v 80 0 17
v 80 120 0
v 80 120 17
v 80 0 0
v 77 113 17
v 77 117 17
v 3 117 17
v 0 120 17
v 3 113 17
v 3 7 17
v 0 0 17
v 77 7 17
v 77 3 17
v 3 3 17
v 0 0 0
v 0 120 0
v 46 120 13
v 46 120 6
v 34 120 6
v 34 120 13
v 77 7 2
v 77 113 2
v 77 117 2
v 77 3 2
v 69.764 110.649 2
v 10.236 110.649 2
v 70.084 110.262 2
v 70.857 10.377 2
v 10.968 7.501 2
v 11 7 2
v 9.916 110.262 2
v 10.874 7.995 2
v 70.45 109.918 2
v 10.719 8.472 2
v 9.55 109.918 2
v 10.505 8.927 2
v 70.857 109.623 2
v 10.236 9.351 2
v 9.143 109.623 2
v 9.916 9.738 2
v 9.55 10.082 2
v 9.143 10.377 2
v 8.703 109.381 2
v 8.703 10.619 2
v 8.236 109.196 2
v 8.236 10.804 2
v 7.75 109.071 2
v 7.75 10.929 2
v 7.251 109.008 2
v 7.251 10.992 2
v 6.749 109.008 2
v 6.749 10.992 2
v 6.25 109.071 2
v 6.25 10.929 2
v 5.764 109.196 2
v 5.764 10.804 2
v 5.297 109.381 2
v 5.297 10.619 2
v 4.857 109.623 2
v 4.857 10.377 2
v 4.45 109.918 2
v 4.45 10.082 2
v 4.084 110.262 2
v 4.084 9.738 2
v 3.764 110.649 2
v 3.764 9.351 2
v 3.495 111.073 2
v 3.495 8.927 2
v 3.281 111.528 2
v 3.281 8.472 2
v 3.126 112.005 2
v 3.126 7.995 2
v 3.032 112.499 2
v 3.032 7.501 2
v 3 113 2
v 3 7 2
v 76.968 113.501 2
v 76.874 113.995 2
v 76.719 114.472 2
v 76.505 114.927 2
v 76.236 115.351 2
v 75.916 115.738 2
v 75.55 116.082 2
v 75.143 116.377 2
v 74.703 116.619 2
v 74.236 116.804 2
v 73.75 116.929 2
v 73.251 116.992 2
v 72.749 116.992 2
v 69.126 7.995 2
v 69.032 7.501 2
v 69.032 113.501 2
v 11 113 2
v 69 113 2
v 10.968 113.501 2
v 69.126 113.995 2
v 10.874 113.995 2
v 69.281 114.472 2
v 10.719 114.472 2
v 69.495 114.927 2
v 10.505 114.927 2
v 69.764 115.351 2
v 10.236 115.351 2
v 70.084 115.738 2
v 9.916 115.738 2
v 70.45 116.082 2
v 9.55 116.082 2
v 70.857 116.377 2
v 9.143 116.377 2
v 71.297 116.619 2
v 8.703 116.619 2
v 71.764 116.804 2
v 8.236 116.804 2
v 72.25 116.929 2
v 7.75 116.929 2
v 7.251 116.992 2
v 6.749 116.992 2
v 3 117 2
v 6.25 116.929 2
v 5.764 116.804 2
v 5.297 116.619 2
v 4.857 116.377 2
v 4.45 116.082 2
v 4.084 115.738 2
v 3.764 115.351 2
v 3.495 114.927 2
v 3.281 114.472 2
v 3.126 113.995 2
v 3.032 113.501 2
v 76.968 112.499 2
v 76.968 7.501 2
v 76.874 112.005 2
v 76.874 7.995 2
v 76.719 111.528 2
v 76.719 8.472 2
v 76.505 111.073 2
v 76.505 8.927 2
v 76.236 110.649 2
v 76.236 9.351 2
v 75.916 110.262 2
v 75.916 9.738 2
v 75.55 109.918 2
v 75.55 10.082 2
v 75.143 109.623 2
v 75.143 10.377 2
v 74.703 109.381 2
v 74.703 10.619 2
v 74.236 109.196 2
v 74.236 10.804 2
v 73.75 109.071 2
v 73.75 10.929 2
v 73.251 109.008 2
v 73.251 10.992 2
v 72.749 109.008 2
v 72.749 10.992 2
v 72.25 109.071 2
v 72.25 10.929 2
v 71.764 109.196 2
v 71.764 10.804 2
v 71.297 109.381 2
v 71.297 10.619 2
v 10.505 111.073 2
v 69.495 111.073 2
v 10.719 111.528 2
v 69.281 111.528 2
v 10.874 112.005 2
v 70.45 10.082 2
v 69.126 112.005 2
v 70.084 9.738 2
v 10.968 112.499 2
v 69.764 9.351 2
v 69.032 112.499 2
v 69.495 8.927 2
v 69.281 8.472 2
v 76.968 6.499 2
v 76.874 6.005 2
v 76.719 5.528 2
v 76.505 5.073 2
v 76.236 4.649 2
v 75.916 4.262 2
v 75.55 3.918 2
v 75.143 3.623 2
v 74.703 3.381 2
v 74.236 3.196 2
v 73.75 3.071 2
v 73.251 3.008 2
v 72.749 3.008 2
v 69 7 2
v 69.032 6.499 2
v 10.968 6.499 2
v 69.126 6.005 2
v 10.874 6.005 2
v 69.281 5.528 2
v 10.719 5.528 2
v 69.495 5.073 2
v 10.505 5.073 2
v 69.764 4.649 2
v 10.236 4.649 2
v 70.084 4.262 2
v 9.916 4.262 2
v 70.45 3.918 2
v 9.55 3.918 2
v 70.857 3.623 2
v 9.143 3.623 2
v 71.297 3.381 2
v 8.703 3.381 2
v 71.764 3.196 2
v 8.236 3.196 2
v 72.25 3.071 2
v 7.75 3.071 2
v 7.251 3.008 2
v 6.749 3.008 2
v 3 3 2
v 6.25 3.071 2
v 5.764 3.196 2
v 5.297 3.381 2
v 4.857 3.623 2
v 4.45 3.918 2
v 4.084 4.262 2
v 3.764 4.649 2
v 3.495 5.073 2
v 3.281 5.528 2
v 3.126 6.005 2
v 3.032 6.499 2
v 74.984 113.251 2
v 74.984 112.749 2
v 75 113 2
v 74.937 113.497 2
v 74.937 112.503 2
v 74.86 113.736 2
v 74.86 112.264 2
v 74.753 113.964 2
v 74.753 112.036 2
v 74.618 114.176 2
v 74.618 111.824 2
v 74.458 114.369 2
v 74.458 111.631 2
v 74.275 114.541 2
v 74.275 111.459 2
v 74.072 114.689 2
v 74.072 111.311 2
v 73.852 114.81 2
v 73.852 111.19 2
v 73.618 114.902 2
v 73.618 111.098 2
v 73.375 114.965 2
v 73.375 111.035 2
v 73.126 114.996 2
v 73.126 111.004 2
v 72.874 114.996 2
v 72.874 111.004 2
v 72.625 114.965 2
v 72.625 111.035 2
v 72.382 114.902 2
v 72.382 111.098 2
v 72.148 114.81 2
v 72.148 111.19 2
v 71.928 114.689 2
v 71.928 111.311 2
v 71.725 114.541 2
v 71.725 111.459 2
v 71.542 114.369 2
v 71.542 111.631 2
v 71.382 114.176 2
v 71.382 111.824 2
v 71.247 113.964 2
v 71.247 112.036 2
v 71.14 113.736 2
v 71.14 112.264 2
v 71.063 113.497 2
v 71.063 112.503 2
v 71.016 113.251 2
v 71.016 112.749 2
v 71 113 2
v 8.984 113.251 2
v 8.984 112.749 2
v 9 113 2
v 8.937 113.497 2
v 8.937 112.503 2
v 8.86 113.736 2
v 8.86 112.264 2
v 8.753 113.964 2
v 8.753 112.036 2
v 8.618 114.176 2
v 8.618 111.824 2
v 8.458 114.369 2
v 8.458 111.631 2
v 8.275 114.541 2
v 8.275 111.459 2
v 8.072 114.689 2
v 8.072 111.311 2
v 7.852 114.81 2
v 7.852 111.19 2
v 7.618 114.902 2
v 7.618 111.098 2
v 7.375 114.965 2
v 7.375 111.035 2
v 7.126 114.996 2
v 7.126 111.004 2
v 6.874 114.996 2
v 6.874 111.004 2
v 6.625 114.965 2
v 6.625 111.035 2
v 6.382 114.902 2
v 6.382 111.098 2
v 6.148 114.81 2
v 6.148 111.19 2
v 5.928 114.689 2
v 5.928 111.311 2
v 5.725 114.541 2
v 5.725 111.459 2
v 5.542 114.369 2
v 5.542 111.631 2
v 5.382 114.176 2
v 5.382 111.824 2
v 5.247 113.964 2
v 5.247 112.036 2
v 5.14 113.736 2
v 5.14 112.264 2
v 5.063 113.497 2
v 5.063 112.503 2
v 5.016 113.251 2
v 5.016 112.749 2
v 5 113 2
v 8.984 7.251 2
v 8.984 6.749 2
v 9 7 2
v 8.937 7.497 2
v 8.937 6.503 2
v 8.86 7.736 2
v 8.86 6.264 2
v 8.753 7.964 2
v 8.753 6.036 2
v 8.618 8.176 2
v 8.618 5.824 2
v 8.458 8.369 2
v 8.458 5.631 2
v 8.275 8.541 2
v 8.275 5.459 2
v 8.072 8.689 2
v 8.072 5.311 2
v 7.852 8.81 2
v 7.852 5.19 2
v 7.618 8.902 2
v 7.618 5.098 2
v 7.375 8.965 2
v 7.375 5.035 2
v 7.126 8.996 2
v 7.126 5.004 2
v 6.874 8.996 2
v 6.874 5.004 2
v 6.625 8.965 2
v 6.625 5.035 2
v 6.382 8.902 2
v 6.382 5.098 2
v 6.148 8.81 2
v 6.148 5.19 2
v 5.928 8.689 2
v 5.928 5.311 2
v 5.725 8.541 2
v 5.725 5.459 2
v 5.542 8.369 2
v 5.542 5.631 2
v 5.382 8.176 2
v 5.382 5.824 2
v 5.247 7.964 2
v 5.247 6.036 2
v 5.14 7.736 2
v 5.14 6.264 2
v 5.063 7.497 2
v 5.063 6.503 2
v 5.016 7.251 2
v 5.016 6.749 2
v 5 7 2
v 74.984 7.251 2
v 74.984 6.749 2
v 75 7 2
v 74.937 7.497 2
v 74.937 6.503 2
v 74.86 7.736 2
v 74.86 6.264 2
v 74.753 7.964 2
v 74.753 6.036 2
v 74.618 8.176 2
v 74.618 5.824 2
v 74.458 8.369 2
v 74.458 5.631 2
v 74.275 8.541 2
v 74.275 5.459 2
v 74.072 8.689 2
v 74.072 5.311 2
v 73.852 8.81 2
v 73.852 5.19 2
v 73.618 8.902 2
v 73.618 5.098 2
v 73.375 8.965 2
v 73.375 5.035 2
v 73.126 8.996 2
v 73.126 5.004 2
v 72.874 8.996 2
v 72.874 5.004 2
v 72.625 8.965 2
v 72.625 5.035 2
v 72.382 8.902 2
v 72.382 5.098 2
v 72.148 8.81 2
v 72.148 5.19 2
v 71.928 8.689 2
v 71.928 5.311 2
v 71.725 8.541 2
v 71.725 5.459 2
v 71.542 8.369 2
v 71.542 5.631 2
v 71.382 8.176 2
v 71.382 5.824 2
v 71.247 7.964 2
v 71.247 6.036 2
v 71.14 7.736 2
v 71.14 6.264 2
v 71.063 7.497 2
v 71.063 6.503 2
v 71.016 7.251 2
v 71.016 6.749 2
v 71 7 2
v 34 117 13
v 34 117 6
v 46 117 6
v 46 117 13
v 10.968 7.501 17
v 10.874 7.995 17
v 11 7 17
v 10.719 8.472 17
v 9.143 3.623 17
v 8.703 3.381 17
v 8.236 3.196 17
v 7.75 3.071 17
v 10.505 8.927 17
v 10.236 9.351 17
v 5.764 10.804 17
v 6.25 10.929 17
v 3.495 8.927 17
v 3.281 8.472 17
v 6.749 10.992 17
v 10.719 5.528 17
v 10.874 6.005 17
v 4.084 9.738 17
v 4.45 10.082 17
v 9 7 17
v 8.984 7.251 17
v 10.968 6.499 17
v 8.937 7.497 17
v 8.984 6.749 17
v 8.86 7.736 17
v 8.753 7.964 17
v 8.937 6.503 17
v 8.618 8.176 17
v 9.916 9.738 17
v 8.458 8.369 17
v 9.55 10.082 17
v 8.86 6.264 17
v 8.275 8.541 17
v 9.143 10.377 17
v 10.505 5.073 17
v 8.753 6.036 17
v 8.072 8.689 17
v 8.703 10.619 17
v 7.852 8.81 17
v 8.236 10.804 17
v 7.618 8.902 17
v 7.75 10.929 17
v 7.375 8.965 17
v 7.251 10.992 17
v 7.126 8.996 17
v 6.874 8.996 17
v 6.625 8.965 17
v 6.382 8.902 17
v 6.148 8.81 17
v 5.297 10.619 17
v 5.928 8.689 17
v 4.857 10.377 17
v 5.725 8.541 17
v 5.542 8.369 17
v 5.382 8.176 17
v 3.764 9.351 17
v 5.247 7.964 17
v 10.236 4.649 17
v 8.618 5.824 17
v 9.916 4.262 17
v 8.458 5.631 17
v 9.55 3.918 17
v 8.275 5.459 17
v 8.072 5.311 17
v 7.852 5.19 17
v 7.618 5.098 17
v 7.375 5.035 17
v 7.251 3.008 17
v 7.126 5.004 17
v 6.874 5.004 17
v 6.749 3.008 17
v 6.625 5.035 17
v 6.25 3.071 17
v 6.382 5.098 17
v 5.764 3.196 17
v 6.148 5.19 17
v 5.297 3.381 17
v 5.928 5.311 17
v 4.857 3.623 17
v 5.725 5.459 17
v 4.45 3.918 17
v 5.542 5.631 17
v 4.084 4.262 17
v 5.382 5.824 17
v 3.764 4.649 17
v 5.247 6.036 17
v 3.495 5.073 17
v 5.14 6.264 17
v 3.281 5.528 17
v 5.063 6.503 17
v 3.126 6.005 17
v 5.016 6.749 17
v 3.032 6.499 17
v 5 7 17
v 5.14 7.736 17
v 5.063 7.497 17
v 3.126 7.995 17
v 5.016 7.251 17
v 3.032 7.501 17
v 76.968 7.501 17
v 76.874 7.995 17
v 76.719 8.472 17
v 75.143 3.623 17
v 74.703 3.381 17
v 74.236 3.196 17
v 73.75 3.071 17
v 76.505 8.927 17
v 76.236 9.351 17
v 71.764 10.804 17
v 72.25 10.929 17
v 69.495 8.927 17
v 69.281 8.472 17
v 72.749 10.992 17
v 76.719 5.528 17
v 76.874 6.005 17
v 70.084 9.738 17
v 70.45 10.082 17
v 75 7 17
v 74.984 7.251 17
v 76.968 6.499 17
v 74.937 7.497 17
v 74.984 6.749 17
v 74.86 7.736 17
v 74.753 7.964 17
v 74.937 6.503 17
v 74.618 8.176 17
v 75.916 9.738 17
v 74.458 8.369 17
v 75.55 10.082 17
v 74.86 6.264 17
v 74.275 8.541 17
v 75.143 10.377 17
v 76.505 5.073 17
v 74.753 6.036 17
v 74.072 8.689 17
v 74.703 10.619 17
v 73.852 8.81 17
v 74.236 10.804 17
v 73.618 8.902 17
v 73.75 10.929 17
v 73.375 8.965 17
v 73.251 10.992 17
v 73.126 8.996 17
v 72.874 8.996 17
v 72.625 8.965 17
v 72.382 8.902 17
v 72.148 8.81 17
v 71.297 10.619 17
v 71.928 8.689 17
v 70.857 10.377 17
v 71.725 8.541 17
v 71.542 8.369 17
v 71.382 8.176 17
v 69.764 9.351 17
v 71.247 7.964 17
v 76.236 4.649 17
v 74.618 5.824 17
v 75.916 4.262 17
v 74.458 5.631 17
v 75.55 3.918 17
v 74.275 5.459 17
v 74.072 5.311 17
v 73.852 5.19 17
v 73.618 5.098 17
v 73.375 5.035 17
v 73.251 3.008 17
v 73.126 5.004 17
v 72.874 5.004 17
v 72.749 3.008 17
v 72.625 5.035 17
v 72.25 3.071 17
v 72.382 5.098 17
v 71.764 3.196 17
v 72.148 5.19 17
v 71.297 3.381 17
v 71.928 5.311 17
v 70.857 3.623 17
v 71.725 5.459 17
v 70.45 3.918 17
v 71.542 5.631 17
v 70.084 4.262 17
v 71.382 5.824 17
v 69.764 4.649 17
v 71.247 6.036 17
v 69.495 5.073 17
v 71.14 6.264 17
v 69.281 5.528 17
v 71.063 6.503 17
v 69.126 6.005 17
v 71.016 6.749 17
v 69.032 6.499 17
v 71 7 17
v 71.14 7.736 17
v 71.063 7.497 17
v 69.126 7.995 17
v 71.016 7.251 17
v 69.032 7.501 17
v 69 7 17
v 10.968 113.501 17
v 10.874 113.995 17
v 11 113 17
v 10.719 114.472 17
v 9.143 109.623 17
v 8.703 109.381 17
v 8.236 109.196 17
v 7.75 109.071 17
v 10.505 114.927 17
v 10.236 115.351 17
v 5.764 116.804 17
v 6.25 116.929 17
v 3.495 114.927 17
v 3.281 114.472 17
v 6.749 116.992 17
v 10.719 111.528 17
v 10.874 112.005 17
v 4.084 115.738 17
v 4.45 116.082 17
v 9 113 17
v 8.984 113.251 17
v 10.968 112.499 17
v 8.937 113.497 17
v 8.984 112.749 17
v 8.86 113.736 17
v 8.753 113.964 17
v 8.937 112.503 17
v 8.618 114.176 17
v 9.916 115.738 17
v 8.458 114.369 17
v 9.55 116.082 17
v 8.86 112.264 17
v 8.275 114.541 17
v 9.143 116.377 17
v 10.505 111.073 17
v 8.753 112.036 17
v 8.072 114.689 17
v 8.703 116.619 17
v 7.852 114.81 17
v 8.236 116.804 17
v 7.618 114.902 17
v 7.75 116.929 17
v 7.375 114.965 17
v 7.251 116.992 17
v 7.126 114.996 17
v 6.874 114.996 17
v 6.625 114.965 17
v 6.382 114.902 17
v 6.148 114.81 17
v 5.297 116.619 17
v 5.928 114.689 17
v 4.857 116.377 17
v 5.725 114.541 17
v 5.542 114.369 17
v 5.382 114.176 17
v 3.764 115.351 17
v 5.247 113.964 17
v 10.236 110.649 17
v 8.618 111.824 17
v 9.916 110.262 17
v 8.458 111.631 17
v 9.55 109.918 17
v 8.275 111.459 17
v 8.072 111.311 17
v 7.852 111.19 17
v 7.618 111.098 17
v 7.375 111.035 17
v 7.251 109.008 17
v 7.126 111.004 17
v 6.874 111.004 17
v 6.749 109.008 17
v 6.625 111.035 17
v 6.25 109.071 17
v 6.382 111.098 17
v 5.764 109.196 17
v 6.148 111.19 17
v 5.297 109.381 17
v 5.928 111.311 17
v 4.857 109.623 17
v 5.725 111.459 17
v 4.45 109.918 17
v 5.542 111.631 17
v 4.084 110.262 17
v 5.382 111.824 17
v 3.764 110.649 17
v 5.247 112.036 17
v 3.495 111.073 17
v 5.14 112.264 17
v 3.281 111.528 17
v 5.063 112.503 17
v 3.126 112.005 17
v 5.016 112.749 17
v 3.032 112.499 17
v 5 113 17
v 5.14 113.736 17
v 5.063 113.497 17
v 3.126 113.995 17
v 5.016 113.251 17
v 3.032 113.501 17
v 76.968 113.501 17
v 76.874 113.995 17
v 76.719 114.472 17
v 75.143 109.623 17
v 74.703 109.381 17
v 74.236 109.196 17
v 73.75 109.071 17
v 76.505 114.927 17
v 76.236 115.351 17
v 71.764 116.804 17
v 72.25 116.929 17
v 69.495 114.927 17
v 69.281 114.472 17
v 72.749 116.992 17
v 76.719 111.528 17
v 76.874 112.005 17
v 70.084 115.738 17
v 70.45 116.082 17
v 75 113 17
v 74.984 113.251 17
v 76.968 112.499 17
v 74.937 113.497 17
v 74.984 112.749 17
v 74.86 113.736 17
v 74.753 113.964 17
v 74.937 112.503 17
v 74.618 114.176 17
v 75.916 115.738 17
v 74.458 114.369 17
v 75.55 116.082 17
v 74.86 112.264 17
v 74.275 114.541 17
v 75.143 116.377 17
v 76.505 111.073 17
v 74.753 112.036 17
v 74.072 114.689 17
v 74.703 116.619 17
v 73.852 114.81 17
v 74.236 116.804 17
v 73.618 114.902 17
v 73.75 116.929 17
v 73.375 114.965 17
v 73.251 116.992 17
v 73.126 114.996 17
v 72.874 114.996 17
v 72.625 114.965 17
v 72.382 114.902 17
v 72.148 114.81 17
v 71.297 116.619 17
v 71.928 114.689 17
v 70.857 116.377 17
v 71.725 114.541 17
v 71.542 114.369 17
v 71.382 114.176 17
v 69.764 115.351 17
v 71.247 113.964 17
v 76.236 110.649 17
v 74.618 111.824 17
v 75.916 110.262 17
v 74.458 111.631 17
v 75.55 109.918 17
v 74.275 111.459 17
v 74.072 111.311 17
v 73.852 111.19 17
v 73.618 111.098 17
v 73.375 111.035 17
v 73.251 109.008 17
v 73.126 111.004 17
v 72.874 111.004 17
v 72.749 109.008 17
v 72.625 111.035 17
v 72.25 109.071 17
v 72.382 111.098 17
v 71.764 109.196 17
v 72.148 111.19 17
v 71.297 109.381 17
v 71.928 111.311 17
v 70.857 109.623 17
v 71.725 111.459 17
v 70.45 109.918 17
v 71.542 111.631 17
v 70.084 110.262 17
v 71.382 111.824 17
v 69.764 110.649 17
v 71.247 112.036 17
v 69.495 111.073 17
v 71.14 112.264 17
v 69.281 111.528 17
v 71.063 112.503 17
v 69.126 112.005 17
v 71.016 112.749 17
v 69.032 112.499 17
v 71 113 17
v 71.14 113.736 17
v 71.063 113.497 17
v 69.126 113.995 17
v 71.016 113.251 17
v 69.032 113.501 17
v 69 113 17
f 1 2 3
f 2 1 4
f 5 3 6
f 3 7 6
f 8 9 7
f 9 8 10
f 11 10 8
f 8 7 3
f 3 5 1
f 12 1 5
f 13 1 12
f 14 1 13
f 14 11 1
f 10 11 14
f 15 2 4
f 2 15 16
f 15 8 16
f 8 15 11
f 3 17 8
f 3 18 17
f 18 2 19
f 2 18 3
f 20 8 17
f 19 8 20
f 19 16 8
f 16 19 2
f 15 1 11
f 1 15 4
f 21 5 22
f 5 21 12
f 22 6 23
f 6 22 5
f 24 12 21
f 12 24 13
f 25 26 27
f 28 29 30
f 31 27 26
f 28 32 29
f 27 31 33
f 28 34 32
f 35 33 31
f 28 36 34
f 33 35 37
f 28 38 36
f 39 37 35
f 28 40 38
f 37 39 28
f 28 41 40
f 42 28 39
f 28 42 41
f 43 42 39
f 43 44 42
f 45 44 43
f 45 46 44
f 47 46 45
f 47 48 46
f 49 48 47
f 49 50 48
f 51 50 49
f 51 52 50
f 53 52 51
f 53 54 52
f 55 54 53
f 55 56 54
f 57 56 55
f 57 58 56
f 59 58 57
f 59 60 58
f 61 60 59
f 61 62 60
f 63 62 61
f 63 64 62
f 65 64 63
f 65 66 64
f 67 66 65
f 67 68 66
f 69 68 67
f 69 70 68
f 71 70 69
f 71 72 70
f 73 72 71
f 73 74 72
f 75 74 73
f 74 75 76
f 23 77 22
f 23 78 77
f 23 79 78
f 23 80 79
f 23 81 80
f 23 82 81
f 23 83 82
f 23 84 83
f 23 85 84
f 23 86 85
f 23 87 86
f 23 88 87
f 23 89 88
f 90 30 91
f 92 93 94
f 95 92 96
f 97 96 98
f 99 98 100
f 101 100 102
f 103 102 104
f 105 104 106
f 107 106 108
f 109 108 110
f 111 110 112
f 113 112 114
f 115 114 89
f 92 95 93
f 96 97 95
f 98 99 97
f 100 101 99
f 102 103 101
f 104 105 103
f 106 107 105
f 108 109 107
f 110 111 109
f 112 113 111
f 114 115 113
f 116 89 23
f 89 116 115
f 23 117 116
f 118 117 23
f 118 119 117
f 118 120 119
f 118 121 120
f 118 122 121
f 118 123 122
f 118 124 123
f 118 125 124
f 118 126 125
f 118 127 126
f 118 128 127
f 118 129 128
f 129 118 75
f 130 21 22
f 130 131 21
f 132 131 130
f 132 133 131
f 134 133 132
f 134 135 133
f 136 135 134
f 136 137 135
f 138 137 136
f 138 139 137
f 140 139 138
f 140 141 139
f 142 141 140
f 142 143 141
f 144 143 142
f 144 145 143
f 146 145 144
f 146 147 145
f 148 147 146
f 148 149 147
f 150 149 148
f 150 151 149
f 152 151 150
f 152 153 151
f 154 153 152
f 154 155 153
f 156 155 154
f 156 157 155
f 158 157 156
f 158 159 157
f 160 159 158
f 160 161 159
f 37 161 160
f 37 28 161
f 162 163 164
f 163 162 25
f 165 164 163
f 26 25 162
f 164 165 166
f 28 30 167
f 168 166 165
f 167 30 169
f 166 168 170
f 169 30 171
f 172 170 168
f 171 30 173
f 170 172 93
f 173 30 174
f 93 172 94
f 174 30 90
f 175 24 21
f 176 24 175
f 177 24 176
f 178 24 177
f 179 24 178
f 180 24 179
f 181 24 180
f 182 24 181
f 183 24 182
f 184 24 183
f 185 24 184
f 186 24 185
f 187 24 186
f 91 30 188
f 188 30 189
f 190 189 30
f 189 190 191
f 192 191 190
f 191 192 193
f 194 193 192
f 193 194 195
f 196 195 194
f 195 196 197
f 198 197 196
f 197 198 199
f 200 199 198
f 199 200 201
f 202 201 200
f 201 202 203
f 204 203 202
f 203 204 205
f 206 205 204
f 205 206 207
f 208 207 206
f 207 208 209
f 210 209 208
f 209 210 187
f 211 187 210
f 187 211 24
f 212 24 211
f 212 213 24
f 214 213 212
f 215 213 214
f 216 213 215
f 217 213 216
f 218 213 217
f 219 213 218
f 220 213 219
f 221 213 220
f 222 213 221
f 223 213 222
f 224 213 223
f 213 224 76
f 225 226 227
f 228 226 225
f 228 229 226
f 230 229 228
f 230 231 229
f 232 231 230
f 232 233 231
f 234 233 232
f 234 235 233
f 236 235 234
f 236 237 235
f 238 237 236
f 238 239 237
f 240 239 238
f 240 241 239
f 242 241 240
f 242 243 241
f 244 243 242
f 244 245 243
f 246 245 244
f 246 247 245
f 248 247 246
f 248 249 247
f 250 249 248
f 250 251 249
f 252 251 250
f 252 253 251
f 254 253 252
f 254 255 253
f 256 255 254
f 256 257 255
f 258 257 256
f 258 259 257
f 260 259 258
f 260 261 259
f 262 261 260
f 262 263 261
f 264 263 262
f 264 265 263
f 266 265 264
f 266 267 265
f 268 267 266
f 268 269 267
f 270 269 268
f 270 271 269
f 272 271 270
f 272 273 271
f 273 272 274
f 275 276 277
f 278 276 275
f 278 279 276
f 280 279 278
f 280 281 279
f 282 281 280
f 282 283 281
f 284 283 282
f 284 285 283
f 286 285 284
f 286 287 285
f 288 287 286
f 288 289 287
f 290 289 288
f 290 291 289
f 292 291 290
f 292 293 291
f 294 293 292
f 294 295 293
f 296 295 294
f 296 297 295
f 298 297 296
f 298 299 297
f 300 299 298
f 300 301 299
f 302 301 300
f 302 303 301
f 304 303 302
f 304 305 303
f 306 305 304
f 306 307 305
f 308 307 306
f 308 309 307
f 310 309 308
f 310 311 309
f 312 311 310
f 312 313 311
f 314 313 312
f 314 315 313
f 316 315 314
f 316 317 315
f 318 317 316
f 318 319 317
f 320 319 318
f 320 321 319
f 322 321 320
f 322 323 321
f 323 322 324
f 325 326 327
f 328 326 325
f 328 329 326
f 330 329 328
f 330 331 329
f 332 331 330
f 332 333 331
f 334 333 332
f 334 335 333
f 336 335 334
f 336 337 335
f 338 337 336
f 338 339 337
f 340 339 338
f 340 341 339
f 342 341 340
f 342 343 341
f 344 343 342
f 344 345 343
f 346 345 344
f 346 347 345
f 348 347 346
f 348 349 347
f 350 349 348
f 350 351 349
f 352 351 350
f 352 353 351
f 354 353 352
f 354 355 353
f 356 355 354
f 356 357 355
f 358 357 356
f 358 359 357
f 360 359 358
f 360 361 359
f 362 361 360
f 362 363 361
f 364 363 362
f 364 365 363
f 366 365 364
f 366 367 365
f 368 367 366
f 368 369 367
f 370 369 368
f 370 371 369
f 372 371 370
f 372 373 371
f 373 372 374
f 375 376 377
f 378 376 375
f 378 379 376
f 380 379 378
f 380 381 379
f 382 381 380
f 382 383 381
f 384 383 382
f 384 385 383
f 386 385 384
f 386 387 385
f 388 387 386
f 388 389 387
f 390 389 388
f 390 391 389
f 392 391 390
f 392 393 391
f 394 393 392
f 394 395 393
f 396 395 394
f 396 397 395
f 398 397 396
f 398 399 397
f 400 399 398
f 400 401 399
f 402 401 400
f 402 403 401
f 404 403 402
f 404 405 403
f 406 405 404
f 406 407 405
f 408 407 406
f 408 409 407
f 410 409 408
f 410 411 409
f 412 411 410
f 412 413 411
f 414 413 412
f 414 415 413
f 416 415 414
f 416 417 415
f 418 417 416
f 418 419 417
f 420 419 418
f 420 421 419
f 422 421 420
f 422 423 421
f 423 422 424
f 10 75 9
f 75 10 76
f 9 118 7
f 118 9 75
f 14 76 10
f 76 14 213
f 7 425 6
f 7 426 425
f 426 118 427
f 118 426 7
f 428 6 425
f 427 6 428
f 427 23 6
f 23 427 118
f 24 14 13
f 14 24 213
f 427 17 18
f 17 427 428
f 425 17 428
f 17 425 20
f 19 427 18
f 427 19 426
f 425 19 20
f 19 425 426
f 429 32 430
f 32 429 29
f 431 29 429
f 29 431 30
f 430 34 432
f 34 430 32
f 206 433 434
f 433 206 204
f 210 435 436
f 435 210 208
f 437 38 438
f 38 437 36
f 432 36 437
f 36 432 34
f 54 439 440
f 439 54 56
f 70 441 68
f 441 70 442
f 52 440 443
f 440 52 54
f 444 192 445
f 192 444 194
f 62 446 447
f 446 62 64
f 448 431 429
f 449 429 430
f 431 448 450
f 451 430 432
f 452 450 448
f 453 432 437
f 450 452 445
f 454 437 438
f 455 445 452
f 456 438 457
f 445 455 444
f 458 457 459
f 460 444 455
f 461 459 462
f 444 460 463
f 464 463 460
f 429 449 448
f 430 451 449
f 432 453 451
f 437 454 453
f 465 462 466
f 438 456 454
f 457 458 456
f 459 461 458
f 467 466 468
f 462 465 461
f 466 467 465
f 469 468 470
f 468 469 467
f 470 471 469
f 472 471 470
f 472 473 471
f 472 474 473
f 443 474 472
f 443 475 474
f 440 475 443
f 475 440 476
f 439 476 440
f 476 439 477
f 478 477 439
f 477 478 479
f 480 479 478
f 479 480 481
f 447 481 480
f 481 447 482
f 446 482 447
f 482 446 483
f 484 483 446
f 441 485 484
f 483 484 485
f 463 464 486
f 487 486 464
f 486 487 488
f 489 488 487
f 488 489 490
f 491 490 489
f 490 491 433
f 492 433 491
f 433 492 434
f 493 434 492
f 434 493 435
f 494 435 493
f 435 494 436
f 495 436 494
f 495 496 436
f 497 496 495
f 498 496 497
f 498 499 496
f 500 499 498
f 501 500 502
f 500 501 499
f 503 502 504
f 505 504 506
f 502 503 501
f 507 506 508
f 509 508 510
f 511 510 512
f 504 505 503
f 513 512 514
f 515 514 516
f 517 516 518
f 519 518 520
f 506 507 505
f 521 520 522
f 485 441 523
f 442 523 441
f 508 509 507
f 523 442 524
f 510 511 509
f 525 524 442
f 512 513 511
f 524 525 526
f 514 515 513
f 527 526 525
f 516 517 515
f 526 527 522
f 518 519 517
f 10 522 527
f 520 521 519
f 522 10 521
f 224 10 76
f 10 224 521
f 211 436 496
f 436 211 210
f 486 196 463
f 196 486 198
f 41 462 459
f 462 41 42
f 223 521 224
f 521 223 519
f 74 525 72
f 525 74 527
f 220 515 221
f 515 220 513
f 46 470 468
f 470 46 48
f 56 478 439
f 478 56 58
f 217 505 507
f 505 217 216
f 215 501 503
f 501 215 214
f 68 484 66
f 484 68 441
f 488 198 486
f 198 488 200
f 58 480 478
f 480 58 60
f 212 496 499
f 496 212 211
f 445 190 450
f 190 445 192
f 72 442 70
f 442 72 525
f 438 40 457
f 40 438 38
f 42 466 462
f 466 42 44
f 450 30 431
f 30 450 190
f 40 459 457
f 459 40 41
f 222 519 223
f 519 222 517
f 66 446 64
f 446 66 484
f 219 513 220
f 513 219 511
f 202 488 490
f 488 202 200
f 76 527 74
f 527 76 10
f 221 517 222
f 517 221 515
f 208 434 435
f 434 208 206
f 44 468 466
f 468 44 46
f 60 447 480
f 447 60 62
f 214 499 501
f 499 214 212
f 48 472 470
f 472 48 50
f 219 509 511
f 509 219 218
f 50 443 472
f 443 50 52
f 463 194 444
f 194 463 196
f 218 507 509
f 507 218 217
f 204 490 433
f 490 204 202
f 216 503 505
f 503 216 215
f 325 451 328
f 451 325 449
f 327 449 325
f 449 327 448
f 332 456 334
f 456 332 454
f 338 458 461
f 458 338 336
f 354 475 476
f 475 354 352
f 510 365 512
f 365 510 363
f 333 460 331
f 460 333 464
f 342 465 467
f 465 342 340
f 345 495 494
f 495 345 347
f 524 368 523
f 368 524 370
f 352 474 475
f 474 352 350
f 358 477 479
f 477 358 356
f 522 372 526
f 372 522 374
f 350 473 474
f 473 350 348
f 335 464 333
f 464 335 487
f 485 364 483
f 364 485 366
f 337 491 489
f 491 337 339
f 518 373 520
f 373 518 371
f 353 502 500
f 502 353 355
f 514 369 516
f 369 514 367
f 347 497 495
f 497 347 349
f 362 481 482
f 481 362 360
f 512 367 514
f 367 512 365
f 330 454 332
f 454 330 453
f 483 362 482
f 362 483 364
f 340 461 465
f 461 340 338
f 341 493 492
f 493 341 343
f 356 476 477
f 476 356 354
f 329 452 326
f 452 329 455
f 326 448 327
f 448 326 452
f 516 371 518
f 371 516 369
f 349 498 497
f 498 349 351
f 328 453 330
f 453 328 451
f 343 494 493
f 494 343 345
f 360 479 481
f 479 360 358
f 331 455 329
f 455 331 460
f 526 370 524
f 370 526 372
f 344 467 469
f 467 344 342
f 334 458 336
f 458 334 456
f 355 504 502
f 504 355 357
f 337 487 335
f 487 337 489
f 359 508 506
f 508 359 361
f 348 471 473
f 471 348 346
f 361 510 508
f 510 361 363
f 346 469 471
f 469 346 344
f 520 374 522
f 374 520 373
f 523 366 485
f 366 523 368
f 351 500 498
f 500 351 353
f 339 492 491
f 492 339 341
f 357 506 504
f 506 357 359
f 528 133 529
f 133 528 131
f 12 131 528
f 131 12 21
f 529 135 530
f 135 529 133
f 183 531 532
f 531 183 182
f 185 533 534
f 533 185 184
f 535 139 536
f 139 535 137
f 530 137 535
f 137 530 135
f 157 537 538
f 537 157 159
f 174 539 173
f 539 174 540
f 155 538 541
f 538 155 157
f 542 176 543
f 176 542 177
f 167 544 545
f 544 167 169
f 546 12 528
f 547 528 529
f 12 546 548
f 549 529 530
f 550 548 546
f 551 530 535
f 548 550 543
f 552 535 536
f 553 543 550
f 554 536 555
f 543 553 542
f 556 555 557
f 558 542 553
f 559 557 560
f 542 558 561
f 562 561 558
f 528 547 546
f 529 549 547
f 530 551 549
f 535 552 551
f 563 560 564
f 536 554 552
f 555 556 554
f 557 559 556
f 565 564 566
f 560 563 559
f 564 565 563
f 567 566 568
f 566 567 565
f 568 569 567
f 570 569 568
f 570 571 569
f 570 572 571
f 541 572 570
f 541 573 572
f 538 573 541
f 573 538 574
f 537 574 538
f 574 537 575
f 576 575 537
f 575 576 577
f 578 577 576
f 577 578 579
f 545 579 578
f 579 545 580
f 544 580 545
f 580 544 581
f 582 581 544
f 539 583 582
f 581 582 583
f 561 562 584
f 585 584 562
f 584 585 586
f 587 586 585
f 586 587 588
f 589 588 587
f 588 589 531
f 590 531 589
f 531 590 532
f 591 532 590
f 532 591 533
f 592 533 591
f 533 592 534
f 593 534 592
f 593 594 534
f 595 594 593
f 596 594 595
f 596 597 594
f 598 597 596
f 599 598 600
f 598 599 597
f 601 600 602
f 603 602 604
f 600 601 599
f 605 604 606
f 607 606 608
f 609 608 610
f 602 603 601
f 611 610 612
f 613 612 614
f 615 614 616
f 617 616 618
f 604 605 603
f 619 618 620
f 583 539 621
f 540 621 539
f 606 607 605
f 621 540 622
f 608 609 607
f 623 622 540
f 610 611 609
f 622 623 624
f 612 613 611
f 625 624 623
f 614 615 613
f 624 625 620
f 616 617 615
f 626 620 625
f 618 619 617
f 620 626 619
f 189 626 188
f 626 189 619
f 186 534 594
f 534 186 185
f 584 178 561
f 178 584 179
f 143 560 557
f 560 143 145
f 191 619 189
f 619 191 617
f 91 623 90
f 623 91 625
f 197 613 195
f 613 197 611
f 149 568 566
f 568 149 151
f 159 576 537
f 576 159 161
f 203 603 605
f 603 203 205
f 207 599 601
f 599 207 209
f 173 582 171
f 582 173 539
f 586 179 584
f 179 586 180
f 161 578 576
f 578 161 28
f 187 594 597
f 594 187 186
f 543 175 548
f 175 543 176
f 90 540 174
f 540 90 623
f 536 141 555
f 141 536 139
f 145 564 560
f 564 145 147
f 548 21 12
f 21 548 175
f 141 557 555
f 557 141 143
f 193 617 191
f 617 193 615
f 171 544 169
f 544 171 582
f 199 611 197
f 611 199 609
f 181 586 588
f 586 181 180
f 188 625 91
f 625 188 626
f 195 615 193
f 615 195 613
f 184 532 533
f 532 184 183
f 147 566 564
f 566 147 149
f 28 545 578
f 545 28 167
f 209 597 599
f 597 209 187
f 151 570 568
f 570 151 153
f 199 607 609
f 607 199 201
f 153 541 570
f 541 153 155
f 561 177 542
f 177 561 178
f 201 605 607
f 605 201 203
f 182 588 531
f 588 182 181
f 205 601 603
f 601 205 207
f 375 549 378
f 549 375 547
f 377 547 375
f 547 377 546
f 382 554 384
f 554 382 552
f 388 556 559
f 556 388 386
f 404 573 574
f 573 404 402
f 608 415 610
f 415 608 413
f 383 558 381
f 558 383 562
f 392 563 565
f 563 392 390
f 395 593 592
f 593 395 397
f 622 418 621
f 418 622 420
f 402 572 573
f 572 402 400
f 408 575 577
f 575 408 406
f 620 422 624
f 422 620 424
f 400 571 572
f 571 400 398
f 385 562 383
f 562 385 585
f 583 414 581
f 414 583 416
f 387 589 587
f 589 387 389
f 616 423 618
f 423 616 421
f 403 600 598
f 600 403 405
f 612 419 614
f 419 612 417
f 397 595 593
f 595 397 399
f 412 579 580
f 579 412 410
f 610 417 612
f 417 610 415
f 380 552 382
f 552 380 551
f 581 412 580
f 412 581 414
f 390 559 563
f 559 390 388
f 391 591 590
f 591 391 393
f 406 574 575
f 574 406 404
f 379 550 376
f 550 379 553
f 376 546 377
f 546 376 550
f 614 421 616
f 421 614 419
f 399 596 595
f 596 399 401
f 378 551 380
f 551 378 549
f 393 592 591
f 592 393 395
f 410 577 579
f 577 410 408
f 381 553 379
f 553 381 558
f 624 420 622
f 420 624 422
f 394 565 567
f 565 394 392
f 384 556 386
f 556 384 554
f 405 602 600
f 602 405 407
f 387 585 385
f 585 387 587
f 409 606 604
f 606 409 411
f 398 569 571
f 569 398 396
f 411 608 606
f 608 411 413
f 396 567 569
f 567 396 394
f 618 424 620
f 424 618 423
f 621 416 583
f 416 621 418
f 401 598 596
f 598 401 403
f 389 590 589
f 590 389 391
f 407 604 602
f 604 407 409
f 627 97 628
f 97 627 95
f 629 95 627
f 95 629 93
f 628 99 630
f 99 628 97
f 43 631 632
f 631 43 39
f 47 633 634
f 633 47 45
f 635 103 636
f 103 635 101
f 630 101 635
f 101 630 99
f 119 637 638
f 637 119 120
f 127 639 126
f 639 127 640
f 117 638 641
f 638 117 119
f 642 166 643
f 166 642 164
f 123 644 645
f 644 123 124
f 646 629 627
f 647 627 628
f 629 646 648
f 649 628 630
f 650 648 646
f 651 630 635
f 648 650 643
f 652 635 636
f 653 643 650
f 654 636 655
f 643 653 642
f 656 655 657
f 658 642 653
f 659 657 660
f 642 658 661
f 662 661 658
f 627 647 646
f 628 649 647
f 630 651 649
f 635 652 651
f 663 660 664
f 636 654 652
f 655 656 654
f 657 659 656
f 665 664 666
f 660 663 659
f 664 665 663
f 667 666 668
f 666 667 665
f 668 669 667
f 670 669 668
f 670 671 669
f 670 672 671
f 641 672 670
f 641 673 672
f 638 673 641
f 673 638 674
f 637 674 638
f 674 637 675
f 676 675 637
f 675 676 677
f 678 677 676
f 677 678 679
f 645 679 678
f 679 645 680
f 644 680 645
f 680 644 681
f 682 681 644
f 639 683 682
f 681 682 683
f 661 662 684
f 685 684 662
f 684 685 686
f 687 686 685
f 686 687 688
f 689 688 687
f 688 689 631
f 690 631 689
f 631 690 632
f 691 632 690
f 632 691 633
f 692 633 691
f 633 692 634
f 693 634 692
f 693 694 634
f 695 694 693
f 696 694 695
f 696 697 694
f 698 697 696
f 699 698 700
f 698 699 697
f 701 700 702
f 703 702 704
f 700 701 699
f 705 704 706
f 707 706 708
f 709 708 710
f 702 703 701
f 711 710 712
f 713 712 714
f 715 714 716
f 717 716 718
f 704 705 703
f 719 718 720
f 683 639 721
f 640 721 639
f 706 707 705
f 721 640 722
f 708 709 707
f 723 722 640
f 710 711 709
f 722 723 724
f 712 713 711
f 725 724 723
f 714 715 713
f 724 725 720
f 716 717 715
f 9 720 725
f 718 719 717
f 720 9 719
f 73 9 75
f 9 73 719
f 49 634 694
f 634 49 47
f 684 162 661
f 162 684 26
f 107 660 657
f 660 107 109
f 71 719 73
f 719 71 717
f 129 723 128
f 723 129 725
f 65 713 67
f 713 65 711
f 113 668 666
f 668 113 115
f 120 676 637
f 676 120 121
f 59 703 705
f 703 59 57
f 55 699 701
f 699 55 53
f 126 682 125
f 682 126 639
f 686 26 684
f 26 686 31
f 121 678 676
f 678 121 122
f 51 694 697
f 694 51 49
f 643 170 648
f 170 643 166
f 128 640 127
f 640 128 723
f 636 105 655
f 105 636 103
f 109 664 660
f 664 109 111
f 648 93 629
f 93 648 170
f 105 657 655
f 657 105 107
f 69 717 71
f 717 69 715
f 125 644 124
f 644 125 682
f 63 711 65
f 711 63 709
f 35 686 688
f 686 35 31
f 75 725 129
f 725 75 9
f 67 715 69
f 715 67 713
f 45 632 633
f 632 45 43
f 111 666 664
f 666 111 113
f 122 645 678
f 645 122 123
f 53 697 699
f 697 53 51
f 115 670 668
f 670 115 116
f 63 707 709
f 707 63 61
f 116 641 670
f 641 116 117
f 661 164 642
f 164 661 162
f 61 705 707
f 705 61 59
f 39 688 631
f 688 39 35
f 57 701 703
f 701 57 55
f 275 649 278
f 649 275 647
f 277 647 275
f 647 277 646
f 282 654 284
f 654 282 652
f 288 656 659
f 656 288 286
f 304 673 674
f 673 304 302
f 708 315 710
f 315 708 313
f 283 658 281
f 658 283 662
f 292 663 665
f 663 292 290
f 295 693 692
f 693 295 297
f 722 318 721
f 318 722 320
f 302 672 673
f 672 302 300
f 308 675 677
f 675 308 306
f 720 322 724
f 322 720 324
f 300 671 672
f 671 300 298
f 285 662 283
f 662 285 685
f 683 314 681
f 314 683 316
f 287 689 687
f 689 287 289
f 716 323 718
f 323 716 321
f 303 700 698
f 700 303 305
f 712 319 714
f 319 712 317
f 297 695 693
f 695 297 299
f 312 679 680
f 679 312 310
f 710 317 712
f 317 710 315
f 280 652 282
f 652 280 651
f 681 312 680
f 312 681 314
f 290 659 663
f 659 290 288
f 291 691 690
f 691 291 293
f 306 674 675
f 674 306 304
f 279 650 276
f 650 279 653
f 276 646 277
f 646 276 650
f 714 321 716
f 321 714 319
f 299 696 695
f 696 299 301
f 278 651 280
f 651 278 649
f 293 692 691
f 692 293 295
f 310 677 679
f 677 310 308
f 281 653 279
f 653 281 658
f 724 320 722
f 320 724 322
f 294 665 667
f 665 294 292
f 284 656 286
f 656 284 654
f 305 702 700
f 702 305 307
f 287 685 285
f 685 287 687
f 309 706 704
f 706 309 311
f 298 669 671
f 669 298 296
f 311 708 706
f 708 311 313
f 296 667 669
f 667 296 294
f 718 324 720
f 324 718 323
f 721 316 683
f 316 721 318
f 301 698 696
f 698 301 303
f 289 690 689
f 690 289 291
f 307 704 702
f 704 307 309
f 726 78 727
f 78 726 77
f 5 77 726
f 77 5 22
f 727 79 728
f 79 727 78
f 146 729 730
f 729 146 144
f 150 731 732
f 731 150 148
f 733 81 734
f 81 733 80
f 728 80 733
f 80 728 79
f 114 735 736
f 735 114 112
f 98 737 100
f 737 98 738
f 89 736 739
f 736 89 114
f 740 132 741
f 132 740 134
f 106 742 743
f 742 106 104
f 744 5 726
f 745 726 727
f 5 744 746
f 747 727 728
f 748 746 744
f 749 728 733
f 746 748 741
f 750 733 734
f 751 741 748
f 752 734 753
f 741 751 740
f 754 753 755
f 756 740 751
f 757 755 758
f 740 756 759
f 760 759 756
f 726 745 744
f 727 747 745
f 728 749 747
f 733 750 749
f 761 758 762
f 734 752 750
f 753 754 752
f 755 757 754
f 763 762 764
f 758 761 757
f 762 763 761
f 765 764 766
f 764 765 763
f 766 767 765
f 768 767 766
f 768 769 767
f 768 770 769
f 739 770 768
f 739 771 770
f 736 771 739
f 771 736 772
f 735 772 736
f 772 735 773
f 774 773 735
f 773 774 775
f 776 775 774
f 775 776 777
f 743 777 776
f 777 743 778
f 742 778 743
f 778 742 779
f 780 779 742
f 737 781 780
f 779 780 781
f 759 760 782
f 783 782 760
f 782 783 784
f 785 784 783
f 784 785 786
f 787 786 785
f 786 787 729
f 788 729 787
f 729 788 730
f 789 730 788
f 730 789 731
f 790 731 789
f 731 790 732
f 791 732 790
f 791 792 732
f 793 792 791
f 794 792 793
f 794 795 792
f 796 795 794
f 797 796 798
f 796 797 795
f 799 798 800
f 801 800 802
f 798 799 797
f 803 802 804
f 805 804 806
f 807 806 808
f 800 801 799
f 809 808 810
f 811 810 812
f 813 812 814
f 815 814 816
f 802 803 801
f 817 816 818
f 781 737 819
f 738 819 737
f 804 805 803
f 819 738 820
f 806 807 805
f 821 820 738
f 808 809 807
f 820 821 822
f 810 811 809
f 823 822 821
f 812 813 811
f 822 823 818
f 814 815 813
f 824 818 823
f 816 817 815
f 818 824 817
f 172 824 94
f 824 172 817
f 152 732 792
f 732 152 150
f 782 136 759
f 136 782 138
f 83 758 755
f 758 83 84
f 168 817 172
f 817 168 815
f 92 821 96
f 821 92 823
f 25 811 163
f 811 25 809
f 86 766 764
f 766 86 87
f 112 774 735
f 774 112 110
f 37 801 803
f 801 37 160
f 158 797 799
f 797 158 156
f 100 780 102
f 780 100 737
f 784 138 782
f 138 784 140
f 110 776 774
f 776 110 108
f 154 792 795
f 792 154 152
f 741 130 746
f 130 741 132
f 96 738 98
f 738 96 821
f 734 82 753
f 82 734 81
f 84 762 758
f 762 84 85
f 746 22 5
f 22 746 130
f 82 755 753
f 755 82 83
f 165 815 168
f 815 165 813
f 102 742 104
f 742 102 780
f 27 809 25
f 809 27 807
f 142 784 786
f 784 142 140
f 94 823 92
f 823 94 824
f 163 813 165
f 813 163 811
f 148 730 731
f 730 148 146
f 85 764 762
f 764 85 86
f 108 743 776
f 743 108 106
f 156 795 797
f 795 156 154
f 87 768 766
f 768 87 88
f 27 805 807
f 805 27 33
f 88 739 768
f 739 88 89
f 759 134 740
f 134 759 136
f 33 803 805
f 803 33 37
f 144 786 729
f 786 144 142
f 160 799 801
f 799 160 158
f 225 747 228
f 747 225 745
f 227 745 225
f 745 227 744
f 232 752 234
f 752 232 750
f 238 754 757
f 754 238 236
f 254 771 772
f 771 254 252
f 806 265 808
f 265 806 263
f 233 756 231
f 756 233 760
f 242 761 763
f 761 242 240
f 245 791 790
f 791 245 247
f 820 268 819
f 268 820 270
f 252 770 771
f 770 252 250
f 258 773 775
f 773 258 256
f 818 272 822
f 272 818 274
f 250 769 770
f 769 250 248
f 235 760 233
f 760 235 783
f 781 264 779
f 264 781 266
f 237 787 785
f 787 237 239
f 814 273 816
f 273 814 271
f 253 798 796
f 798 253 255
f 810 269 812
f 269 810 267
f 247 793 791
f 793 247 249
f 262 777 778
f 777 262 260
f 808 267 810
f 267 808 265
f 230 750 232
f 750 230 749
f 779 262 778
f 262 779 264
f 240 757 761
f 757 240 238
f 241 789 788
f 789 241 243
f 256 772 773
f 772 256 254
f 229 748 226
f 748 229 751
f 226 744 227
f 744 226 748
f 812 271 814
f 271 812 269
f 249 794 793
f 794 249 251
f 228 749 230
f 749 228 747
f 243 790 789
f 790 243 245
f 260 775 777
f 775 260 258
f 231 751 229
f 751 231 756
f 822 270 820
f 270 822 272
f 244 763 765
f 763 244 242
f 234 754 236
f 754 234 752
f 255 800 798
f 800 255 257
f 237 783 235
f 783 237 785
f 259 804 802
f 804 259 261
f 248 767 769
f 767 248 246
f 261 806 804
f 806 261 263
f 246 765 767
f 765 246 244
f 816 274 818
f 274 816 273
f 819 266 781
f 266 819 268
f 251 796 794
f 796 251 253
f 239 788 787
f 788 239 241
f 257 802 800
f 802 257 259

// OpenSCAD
// --- TACTICAL HACKPAD BOTTOM CHASSIS ---
// Matches the 80x120mm top plate with internal routing space

$fn = 50;

width = 80;
height = 120;
depth = 15;        // Internal space for wiring and the RP2040
wall = 3;          // 3mm thick walls for durability
floor_thick = 2;   // 2mm solid bottom floor

difference() {
    // 1. The Main Solid Block
    cube([width, height, depth + floor_thick]);

    // 2. Hollow out the inside for electronics
    translate([wall, wall, floor_thick])
        cube([width - (2*wall), height - (2*wall), depth + 1]);

    // 3. USB-C Port Cutout (Top Edge)
    // Centered, allowing plenty of clearance for a standard USB-C cable
    translate([width/2 - 6, height - wall - 1, floor_thick + 4])
        cube([12, wall + 2, 7]);
}

// 4. --- MOUNTING STANDOFFS ---
// Corner posts with 4mm holes to melt the M3 heatset inserts into
module standoff(x, y) {
    translate([x, y, floor_thick])
        difference() {
            cylinder(h=depth, d=8); // The solid post
            cylinder(h=depth+1, d=4); // The hole for the brass insert
        }
}

// Place standoffs in the four corners
standoff(wall + 4, wall + 4);
standoff(width - wall - 4, wall + 4);
standoff(wall + 4, height - wall - 4);
standoff(width - wall - 4, height - wall - 4);
